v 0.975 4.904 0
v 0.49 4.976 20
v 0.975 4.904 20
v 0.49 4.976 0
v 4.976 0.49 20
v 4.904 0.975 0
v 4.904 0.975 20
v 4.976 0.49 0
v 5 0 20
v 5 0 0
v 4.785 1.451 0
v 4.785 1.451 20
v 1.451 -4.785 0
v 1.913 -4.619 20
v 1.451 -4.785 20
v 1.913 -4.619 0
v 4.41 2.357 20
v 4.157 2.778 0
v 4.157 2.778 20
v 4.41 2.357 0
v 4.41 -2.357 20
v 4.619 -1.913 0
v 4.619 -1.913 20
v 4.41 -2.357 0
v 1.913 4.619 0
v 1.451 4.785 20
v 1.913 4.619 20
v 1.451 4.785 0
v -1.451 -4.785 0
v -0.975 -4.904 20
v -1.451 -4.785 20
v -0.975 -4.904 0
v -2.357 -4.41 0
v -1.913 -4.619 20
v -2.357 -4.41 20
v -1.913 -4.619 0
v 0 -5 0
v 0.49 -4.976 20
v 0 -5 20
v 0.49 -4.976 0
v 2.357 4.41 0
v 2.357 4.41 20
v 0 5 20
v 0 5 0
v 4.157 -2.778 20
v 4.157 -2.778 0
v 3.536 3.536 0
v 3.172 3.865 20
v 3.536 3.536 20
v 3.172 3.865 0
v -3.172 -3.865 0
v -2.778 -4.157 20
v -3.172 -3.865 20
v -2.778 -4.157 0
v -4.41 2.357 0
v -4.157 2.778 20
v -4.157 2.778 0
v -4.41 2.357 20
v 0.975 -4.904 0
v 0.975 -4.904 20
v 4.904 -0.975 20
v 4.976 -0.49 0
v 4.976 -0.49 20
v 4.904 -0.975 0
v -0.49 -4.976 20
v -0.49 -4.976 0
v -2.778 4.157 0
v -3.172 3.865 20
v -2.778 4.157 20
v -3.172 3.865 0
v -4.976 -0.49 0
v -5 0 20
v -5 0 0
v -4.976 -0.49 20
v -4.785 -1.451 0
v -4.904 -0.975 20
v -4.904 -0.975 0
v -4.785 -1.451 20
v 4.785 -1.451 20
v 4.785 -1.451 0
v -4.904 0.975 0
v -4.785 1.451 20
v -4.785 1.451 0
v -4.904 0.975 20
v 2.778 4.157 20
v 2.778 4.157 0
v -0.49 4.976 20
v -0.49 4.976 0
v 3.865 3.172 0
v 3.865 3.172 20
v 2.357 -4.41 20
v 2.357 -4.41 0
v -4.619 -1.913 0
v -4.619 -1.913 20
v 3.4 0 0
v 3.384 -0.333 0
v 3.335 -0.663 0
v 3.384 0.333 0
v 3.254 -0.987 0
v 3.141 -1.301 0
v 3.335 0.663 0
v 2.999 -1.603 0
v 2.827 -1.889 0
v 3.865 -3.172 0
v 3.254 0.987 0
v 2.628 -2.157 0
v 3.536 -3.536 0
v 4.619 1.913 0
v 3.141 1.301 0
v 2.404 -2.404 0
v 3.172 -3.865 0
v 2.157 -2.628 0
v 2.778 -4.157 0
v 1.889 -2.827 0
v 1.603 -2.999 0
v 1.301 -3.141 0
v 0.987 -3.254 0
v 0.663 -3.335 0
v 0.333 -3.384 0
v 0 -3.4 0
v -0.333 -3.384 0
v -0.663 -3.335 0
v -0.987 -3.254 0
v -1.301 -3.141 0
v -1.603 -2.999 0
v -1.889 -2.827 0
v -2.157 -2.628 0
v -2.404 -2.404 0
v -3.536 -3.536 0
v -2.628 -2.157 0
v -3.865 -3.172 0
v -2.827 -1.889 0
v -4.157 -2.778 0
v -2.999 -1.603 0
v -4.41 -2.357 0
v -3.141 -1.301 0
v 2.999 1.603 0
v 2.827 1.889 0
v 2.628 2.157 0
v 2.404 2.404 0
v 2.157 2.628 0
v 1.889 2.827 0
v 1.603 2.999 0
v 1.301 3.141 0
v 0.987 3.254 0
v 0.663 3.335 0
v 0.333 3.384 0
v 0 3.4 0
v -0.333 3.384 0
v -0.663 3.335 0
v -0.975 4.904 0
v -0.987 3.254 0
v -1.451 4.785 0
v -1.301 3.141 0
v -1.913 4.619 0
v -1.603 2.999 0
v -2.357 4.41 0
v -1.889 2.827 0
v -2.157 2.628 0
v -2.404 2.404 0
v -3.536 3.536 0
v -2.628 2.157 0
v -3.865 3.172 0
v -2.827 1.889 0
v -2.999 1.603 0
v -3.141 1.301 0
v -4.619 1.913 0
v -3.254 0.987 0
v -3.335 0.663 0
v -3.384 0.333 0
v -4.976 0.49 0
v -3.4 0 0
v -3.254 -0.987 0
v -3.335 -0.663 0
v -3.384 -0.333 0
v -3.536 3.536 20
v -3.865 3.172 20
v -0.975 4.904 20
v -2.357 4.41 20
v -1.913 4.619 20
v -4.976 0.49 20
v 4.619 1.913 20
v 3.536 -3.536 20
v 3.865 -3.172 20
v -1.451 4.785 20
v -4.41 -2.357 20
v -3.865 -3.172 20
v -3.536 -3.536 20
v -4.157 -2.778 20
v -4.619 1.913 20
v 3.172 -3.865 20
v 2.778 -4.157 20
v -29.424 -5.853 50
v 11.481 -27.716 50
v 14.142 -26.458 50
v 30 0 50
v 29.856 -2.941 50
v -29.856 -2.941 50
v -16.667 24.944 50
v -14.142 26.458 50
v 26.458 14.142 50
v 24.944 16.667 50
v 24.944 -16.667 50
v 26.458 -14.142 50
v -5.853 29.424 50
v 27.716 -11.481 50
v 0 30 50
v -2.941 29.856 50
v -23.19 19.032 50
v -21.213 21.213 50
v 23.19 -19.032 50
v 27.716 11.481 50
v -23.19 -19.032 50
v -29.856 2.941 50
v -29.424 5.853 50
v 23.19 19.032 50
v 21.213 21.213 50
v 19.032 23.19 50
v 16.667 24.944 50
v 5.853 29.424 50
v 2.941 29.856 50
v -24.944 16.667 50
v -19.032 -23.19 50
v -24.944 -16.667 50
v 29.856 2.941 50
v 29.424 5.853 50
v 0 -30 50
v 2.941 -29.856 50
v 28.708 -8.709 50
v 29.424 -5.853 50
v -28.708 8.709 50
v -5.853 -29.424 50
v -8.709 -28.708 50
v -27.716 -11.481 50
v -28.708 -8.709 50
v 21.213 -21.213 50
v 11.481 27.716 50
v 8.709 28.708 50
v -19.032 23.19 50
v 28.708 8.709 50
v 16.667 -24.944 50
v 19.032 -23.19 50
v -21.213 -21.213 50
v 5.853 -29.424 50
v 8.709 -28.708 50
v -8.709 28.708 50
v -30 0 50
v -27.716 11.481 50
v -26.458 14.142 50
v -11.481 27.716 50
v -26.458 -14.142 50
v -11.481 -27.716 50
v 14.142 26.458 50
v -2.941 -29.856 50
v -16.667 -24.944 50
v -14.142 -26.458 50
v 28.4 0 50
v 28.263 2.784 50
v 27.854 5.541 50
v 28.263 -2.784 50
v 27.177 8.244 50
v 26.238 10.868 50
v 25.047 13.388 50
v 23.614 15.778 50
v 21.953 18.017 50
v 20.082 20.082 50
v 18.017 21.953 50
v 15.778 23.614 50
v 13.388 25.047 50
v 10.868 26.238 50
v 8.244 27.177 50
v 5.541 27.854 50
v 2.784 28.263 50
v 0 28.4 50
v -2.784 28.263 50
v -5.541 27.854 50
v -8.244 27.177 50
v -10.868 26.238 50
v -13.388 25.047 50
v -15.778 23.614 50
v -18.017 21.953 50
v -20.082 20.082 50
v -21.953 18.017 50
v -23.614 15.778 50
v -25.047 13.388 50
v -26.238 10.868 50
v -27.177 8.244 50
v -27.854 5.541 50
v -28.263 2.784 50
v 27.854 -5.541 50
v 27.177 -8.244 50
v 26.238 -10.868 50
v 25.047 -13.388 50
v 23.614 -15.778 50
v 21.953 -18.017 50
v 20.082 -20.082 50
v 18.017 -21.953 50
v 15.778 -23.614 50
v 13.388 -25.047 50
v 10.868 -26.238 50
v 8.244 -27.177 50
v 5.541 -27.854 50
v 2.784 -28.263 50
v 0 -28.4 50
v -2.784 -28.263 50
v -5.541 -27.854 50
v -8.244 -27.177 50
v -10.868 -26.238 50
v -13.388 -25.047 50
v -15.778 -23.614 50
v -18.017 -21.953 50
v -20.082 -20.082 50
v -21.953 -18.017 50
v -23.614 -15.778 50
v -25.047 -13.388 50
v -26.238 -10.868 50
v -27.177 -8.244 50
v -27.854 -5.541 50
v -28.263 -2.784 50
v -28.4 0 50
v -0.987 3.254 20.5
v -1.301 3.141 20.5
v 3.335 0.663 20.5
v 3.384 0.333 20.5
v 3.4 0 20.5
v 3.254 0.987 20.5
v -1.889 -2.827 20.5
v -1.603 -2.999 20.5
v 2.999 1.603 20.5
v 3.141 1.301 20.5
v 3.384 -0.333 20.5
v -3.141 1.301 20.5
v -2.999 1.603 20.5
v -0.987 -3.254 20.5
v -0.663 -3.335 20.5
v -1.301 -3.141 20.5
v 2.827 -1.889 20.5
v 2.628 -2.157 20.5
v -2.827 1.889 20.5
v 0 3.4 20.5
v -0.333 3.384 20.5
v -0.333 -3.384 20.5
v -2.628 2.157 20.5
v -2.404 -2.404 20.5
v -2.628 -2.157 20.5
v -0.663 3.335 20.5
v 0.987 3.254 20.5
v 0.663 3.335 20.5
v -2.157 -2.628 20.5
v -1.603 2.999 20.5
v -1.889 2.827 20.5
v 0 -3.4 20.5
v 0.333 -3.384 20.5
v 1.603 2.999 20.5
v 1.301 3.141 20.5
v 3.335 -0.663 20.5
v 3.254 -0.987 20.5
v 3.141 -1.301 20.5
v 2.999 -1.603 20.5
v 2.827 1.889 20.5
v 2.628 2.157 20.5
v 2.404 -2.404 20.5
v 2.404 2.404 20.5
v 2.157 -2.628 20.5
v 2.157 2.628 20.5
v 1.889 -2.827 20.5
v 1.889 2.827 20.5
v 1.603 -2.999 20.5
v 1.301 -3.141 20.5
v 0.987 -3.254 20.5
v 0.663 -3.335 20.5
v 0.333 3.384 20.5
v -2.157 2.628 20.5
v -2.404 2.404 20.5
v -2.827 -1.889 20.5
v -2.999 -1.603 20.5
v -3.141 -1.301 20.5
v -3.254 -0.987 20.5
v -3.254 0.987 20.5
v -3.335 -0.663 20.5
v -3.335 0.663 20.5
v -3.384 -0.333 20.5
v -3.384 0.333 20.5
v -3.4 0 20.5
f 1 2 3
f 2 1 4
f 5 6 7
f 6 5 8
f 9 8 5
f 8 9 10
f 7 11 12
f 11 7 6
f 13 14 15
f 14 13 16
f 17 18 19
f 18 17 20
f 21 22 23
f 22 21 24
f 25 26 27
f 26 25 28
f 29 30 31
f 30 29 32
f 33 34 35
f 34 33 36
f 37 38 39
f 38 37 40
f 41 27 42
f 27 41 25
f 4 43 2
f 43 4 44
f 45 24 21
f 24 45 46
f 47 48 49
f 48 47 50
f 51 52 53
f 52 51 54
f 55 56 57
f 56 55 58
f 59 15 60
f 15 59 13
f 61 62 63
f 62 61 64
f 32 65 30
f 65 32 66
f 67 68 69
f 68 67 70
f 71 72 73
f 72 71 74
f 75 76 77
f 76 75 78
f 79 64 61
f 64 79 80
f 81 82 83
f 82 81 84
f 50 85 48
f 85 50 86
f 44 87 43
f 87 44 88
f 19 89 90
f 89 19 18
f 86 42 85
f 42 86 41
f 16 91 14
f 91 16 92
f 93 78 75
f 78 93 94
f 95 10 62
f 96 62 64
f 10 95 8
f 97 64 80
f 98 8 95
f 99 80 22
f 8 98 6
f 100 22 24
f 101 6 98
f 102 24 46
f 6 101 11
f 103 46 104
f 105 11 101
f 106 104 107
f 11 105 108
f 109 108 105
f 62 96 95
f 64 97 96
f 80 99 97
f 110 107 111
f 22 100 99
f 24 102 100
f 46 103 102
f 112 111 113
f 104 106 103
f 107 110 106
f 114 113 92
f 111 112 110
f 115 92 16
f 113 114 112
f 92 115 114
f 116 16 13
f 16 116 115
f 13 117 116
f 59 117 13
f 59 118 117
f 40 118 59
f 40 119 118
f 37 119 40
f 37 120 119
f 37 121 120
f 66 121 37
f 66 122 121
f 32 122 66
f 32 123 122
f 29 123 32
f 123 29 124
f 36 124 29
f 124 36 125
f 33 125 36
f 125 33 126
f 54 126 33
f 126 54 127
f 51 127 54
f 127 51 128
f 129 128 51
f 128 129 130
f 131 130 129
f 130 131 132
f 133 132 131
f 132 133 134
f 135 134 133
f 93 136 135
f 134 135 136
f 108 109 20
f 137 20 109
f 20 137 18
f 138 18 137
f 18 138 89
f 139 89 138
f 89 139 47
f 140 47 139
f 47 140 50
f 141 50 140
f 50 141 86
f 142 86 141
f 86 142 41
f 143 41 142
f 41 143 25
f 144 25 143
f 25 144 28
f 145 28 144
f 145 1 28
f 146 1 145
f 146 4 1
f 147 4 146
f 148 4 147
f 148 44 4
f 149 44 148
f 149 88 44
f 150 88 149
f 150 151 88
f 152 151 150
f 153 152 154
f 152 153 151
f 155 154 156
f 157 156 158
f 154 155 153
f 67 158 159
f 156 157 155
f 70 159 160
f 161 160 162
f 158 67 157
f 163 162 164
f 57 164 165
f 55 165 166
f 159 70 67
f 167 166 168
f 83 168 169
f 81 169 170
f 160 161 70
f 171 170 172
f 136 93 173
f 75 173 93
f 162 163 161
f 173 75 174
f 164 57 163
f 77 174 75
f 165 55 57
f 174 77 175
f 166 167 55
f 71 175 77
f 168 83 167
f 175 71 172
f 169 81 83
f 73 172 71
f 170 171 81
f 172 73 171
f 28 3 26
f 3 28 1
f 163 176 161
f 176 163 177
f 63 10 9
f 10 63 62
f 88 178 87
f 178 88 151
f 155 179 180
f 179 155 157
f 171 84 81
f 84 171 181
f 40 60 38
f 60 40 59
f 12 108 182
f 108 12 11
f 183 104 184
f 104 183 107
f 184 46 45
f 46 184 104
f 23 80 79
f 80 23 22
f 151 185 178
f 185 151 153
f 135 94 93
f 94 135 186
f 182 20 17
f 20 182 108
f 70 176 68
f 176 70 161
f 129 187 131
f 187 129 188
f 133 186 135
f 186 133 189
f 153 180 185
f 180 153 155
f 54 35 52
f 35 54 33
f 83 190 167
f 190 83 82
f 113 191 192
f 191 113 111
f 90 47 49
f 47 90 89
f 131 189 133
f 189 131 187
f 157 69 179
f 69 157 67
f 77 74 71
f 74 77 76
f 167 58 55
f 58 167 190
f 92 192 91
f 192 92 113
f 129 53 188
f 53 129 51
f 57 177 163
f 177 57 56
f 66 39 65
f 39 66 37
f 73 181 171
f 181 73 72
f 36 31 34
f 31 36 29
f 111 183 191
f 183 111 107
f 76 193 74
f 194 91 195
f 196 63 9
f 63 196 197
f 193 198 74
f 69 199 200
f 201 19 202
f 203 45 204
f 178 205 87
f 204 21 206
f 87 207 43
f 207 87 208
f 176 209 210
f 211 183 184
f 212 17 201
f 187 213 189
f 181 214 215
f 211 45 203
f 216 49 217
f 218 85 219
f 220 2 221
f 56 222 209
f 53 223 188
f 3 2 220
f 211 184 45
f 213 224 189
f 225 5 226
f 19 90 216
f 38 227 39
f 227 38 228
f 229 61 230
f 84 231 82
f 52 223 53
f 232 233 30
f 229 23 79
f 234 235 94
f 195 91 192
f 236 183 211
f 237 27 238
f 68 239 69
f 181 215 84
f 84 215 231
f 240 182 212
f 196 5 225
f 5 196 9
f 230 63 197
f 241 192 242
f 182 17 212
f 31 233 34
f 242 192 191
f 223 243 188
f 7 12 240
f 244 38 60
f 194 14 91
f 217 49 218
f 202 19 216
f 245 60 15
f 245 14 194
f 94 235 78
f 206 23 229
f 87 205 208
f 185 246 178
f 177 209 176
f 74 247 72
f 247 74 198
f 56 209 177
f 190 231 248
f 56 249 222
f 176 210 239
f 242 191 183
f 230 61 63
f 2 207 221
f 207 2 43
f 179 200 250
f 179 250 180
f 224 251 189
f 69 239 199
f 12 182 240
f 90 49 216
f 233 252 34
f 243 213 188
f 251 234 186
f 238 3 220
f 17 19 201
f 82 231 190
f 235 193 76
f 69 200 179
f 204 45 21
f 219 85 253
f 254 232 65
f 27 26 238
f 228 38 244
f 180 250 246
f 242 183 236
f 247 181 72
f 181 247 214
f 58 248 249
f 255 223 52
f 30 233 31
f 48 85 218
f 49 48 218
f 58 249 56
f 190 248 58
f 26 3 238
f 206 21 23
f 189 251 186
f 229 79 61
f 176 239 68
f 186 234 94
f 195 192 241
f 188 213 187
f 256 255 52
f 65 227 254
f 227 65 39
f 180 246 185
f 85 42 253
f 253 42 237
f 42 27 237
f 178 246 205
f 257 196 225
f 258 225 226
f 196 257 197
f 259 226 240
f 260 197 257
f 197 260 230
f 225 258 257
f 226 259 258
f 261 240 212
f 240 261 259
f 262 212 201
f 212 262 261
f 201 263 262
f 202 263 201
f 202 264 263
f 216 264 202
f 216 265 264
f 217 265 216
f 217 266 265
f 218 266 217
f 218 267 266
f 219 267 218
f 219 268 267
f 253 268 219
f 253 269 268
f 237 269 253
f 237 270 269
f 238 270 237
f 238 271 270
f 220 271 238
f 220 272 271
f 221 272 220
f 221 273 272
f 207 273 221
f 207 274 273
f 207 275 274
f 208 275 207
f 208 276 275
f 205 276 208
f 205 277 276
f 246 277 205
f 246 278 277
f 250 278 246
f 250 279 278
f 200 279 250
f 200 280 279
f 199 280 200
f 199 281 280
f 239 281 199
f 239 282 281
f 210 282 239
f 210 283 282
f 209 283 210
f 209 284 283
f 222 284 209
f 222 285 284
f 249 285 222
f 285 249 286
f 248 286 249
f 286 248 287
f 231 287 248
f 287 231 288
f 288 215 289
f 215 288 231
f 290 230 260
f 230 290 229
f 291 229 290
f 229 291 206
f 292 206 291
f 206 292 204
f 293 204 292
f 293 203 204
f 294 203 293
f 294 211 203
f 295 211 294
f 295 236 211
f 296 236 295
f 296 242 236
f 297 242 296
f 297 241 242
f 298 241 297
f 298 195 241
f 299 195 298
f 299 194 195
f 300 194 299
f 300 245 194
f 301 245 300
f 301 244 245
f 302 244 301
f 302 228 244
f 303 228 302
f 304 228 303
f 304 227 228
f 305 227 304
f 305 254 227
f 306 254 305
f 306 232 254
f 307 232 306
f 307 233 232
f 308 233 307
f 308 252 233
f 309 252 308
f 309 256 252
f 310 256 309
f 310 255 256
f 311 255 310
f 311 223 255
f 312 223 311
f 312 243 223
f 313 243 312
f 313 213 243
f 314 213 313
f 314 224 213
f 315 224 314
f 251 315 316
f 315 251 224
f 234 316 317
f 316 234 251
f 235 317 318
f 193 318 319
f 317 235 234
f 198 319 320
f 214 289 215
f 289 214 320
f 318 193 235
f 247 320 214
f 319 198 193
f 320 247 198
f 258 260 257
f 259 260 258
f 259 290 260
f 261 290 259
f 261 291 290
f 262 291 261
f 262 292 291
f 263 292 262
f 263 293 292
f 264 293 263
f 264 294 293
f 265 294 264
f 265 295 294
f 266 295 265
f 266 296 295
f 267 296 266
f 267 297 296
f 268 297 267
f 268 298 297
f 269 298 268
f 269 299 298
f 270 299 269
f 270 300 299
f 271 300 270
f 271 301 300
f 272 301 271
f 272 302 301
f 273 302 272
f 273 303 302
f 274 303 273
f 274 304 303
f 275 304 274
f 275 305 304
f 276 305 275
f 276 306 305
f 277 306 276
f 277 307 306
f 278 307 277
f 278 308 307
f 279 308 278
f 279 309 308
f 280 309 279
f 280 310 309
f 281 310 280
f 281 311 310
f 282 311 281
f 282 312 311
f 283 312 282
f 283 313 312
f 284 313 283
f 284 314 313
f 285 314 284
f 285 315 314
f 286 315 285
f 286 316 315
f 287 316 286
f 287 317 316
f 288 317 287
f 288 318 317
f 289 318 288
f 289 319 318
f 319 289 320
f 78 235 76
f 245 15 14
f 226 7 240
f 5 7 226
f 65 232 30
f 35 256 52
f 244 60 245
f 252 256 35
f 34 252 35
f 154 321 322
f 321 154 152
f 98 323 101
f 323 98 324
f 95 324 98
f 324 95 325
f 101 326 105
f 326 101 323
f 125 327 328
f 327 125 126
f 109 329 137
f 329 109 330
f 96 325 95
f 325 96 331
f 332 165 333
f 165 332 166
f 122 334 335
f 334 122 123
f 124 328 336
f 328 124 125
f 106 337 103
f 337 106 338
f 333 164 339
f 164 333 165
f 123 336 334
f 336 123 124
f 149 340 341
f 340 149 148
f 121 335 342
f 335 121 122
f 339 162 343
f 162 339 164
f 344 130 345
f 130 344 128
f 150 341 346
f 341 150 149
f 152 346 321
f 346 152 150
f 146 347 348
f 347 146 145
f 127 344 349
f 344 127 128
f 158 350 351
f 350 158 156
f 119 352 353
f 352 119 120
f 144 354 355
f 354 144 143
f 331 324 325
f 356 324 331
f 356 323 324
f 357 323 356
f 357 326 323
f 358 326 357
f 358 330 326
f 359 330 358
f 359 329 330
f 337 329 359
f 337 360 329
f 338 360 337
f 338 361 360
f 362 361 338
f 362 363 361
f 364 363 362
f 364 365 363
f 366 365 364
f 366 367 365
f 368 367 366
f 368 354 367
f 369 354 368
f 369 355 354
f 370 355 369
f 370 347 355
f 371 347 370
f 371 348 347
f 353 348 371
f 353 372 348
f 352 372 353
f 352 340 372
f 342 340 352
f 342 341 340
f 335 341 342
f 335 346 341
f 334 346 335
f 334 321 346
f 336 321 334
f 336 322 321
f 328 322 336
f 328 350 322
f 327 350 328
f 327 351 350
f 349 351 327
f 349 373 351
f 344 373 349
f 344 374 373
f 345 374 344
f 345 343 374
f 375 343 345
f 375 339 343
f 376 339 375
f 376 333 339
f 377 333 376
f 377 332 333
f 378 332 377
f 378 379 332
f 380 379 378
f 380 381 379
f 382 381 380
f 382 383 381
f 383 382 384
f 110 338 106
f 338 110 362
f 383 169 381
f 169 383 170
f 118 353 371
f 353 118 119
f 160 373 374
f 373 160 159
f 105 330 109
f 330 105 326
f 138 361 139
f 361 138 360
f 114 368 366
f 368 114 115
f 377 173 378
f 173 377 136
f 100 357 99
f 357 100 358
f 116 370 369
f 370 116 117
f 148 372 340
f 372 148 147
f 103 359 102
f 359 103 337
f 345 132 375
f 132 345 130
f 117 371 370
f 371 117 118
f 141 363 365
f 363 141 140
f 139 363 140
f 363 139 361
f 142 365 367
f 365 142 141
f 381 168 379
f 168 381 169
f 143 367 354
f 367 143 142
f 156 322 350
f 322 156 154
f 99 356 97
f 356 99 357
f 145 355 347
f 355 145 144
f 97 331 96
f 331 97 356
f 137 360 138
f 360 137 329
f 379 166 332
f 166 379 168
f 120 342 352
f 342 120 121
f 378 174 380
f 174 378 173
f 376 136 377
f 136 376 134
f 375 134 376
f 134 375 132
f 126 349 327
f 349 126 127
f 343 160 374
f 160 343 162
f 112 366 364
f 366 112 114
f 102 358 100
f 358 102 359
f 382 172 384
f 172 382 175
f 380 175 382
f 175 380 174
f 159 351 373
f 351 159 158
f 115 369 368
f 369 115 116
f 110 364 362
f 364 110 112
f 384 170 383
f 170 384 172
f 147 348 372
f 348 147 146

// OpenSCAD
// Funnel with spout - printed upright, wide opening at the top
// Units: mm. Straight spout (tube) from z = 0 to z = 20, then a cone
// widens to the rim at z = 50. Wall 1.6 mm thick. Open top and bottom.

$fn = 64;

// ---- Dimensions ----
spout_d        = 10;   // spout outer diameter
spout_bore     = 6.8;  // spout bore (10 - 2*1.6)
spout_h        = 20;   // spout height (z = 0 to z = 20)
cone_top_d     = 10;   // cone outer diameter at z = 20 (top of spout)
cone_rim_d     = 60;   // cone outer diameter at the rim (z = 50)
wall           = 1.6;  // wall thickness, spout and cone
cone_h         = 30;   // cone height (z = 20 to z = 50)
eps            = 0.5;  // cutter overshoot past faces

// ---- Derived ----
rim_r          = cone_rim_d / 2;
spout_r        = spout_d / 2;
cone_top_r     = cone_top_d / 2;
bore_r         = spout_bore / 2;

// ---- Model ----
difference() {
    union() {
        // Spout: cylinder, z = 0 to 20
        cylinder(h = spout_h, r = spout_r);

        // Cone: z = 20 to 50, diameter grows 10 -> 60
        translate([0, 0, spout_h])
            cylinder(h = cone_h, r1 = cone_top_r, r2 = rim_r);
    }

    // Bore through the spout (full height)
    translate([0, 0, -eps])
        cylinder(h = spout_h + 2 * eps, r = bore_r);

    // Open top rim cut
    translate([0, 0, spout_h + cone_h])
        cylinder(h = eps, r = rim_r - wall);   // open at z = 50

    // Open bottom end of spout
    translate([0, 0, -eps])
        cylinder(h = spout_h + 2 * eps, r = spout_r - wall);   // open at z = 0
}
